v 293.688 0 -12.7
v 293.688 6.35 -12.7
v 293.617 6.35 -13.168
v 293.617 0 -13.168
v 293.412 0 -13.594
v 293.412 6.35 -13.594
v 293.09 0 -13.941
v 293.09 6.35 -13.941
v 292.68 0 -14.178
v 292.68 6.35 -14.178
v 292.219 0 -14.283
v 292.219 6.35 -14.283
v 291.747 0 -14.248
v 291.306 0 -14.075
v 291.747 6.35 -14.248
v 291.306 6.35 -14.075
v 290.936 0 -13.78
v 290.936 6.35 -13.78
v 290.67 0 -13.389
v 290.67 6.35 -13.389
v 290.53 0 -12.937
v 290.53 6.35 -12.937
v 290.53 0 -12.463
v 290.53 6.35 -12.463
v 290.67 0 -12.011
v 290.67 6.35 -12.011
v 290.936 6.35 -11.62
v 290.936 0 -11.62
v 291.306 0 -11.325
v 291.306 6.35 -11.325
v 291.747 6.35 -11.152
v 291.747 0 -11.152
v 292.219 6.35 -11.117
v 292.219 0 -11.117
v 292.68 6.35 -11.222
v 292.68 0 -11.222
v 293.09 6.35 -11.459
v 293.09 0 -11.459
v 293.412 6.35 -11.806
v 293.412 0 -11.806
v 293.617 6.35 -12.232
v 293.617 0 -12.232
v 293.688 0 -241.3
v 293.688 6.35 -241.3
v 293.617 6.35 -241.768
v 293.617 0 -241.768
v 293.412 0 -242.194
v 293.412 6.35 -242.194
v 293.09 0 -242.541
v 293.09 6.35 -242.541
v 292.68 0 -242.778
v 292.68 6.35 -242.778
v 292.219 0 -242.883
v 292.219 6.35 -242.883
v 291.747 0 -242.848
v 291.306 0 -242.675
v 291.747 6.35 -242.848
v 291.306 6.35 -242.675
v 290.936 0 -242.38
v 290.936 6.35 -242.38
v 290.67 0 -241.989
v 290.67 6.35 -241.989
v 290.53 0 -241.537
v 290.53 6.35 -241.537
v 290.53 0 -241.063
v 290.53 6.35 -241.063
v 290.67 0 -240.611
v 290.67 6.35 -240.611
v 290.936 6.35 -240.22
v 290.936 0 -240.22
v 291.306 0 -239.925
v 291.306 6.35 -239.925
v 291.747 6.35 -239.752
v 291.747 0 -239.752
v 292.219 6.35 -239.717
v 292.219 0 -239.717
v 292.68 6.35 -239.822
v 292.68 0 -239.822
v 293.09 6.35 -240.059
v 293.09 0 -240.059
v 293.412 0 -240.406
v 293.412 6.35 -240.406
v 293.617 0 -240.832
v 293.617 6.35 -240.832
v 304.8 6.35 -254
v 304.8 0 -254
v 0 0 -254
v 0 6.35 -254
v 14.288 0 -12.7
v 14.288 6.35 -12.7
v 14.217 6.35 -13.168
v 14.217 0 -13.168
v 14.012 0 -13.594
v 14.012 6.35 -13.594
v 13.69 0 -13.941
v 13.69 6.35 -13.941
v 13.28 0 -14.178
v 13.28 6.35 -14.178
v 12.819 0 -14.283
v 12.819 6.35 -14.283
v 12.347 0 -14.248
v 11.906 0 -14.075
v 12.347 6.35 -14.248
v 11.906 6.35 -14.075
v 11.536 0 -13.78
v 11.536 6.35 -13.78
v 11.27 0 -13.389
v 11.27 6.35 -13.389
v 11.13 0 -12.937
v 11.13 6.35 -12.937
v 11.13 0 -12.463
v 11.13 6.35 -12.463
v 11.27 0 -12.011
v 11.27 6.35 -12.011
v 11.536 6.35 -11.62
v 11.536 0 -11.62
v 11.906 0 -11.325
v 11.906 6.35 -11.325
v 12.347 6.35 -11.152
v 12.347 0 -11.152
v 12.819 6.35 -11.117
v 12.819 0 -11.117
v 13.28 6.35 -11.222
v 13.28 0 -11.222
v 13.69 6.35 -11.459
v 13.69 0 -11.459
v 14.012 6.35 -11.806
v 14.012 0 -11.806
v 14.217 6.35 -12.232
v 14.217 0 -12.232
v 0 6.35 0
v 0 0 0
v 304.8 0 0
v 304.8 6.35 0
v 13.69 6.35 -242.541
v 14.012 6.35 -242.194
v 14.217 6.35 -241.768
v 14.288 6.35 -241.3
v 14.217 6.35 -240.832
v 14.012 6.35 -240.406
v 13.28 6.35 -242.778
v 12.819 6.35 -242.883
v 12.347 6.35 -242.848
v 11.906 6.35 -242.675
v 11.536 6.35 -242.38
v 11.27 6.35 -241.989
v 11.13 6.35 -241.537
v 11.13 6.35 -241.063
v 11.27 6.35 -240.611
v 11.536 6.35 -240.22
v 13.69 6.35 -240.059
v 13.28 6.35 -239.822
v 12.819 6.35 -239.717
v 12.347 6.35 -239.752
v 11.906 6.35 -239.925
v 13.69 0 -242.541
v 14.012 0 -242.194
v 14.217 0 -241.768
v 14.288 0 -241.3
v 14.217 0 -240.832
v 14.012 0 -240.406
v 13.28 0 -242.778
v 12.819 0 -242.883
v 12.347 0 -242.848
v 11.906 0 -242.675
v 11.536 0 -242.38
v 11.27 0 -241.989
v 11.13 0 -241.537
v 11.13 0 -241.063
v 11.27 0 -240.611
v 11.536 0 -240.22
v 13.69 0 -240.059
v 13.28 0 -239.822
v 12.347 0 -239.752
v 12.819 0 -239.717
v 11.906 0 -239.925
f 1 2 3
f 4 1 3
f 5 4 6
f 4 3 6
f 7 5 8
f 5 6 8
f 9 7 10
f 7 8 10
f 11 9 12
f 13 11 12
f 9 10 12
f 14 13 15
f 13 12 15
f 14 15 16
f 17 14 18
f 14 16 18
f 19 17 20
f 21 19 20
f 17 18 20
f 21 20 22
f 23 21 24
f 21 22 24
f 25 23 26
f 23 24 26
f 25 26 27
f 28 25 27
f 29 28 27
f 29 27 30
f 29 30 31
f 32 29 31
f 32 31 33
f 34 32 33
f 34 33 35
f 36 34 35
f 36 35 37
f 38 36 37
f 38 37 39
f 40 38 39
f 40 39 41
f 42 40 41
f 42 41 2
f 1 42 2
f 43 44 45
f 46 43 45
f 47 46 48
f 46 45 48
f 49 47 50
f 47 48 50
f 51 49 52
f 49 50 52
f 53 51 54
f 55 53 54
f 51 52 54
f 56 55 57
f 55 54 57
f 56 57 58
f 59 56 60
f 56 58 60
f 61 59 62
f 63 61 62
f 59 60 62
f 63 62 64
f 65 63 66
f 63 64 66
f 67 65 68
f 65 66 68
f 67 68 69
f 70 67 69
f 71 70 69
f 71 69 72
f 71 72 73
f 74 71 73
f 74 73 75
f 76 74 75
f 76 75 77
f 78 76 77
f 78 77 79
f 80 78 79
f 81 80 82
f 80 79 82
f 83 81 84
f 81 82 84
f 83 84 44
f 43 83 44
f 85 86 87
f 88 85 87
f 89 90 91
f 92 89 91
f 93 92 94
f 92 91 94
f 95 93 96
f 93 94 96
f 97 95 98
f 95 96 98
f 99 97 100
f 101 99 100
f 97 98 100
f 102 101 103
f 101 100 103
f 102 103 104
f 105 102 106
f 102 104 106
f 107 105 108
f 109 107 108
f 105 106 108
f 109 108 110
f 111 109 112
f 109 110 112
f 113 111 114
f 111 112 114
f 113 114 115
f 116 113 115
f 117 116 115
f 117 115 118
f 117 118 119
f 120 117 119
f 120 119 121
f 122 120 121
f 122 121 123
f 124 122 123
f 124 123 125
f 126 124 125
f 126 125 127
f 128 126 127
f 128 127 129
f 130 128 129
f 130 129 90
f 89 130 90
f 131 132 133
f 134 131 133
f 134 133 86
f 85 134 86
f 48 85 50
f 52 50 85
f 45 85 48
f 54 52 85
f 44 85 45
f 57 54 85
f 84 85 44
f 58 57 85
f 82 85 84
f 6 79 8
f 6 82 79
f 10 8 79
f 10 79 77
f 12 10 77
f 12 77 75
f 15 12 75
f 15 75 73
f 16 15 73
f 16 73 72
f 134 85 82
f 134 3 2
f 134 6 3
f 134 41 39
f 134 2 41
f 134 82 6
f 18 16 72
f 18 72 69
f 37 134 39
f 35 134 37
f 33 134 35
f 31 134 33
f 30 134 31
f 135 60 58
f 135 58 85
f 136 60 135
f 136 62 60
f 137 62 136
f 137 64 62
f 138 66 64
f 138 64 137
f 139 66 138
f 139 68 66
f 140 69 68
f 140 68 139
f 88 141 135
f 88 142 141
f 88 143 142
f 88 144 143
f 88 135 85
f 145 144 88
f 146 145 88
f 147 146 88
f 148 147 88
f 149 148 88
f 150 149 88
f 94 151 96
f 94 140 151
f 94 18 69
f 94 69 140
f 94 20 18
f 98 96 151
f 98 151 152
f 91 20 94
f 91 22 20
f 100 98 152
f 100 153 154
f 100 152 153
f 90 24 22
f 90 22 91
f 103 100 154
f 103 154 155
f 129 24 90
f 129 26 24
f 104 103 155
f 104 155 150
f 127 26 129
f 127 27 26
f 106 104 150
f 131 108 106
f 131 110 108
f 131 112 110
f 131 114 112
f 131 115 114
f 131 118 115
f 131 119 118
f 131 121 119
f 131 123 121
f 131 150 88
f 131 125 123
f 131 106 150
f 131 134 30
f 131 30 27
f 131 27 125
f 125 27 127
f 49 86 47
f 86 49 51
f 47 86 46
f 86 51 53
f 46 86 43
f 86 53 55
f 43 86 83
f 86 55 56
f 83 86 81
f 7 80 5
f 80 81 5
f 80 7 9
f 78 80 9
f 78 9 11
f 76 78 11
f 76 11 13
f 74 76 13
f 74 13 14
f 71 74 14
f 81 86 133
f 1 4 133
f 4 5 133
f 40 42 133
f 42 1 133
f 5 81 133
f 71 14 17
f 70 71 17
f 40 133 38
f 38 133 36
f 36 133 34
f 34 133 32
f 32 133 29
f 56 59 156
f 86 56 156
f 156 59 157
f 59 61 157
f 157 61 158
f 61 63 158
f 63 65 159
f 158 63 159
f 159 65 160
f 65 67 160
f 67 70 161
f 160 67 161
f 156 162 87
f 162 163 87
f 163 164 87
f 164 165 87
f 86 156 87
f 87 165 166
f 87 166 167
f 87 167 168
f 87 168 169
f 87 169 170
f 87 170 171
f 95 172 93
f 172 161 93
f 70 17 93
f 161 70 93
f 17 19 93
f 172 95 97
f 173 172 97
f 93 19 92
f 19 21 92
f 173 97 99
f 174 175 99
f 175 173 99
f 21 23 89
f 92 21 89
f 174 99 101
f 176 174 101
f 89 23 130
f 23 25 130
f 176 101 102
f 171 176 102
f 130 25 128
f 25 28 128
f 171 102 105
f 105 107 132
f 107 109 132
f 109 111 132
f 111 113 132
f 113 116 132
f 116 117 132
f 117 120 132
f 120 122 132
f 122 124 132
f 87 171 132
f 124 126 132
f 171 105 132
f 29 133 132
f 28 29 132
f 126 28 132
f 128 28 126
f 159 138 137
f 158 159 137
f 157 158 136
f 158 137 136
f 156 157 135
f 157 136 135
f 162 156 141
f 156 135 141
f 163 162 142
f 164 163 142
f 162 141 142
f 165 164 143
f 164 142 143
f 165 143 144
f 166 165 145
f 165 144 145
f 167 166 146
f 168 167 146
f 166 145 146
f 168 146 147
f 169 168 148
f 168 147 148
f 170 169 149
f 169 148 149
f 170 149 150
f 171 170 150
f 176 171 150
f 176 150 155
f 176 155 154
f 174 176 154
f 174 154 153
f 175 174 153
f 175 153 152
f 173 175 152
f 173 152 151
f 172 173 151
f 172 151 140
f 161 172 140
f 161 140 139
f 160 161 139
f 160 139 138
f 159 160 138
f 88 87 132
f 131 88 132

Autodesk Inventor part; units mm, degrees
ref_plane "YZ Plane" through (0, 0, 0) normal (1, 0, 0) x (0, 1, 0)
ref_plane "XZ Plane" through (0, 0, 0) normal (0, 1, 0) x (-1, 0, 0)
ref_plane "XY Plane" through (0, 0, 0) normal (0, 0, 1) x (1, 0, 0)
sketch "Sketch1" plane through (0, 0, 0) normal (0, 1, 0) x (-1, 0, 0)
  line L0 (-12.7, -1435.0315) -> (292.1, -1435.0315)
  line L1 (292.1, -1435.0315) -> (292.1, -1689.0315)
  line L2 (292.1, -1689.0315) -> (-12.7, -1689.0315)
  line L3 (-12.7, -1689.0315) -> (-12.7, -1435.0315)
  line L4 (0, 0) -> (-304.8, 0)
  line L5 (-304.8, 0) -> (-304.8, -254)
  line L6 (-304.8, -254) -> (0, -254)
  line L7 (0, -254) -> (0, 0)
  dimension "d0" = 304.8
  dimension "d1" = 254
  dimension "d2" = 304.8
  dimension "d3" = 254
extrude "Extrusion1" add sketch "Sketch1" along normal blind 6.35 contours L7 L6 L5 L4
sketch "Sketch2" plane through (0, 6.35, 0) normal (0, 1, 0) x (1, 0, 0)
  circle A0 centre (12.7, 12.7) radius 1.5875
  circle A1 centre (12.7, 241.3) radius 1.5875
  circle A2 centre (292.1, 12.7) radius 1.5875
  circle A3 centre (292.1, 241.3) radius 1.5875
  line L0 (304.8, 254) -> (0, 254) projected
  line L1 (0, 0) -> (304.8, 0) projected
  line L2 (0, 254) -> (0, 0) projected
  line L3 (304.8, 0) -> (304.8, 254) projected
  dimension "d6" = 3.175
  dimension "d7" = 12.7
  dimension "d8" = 12.7
  dimension "d9" = 12.7
  dimension "d10" = 12.7
extrude "Extrusion2" cut sketch "Sketch2" against normal blind 6.35 contours A0 | A1 | A2 | A3
